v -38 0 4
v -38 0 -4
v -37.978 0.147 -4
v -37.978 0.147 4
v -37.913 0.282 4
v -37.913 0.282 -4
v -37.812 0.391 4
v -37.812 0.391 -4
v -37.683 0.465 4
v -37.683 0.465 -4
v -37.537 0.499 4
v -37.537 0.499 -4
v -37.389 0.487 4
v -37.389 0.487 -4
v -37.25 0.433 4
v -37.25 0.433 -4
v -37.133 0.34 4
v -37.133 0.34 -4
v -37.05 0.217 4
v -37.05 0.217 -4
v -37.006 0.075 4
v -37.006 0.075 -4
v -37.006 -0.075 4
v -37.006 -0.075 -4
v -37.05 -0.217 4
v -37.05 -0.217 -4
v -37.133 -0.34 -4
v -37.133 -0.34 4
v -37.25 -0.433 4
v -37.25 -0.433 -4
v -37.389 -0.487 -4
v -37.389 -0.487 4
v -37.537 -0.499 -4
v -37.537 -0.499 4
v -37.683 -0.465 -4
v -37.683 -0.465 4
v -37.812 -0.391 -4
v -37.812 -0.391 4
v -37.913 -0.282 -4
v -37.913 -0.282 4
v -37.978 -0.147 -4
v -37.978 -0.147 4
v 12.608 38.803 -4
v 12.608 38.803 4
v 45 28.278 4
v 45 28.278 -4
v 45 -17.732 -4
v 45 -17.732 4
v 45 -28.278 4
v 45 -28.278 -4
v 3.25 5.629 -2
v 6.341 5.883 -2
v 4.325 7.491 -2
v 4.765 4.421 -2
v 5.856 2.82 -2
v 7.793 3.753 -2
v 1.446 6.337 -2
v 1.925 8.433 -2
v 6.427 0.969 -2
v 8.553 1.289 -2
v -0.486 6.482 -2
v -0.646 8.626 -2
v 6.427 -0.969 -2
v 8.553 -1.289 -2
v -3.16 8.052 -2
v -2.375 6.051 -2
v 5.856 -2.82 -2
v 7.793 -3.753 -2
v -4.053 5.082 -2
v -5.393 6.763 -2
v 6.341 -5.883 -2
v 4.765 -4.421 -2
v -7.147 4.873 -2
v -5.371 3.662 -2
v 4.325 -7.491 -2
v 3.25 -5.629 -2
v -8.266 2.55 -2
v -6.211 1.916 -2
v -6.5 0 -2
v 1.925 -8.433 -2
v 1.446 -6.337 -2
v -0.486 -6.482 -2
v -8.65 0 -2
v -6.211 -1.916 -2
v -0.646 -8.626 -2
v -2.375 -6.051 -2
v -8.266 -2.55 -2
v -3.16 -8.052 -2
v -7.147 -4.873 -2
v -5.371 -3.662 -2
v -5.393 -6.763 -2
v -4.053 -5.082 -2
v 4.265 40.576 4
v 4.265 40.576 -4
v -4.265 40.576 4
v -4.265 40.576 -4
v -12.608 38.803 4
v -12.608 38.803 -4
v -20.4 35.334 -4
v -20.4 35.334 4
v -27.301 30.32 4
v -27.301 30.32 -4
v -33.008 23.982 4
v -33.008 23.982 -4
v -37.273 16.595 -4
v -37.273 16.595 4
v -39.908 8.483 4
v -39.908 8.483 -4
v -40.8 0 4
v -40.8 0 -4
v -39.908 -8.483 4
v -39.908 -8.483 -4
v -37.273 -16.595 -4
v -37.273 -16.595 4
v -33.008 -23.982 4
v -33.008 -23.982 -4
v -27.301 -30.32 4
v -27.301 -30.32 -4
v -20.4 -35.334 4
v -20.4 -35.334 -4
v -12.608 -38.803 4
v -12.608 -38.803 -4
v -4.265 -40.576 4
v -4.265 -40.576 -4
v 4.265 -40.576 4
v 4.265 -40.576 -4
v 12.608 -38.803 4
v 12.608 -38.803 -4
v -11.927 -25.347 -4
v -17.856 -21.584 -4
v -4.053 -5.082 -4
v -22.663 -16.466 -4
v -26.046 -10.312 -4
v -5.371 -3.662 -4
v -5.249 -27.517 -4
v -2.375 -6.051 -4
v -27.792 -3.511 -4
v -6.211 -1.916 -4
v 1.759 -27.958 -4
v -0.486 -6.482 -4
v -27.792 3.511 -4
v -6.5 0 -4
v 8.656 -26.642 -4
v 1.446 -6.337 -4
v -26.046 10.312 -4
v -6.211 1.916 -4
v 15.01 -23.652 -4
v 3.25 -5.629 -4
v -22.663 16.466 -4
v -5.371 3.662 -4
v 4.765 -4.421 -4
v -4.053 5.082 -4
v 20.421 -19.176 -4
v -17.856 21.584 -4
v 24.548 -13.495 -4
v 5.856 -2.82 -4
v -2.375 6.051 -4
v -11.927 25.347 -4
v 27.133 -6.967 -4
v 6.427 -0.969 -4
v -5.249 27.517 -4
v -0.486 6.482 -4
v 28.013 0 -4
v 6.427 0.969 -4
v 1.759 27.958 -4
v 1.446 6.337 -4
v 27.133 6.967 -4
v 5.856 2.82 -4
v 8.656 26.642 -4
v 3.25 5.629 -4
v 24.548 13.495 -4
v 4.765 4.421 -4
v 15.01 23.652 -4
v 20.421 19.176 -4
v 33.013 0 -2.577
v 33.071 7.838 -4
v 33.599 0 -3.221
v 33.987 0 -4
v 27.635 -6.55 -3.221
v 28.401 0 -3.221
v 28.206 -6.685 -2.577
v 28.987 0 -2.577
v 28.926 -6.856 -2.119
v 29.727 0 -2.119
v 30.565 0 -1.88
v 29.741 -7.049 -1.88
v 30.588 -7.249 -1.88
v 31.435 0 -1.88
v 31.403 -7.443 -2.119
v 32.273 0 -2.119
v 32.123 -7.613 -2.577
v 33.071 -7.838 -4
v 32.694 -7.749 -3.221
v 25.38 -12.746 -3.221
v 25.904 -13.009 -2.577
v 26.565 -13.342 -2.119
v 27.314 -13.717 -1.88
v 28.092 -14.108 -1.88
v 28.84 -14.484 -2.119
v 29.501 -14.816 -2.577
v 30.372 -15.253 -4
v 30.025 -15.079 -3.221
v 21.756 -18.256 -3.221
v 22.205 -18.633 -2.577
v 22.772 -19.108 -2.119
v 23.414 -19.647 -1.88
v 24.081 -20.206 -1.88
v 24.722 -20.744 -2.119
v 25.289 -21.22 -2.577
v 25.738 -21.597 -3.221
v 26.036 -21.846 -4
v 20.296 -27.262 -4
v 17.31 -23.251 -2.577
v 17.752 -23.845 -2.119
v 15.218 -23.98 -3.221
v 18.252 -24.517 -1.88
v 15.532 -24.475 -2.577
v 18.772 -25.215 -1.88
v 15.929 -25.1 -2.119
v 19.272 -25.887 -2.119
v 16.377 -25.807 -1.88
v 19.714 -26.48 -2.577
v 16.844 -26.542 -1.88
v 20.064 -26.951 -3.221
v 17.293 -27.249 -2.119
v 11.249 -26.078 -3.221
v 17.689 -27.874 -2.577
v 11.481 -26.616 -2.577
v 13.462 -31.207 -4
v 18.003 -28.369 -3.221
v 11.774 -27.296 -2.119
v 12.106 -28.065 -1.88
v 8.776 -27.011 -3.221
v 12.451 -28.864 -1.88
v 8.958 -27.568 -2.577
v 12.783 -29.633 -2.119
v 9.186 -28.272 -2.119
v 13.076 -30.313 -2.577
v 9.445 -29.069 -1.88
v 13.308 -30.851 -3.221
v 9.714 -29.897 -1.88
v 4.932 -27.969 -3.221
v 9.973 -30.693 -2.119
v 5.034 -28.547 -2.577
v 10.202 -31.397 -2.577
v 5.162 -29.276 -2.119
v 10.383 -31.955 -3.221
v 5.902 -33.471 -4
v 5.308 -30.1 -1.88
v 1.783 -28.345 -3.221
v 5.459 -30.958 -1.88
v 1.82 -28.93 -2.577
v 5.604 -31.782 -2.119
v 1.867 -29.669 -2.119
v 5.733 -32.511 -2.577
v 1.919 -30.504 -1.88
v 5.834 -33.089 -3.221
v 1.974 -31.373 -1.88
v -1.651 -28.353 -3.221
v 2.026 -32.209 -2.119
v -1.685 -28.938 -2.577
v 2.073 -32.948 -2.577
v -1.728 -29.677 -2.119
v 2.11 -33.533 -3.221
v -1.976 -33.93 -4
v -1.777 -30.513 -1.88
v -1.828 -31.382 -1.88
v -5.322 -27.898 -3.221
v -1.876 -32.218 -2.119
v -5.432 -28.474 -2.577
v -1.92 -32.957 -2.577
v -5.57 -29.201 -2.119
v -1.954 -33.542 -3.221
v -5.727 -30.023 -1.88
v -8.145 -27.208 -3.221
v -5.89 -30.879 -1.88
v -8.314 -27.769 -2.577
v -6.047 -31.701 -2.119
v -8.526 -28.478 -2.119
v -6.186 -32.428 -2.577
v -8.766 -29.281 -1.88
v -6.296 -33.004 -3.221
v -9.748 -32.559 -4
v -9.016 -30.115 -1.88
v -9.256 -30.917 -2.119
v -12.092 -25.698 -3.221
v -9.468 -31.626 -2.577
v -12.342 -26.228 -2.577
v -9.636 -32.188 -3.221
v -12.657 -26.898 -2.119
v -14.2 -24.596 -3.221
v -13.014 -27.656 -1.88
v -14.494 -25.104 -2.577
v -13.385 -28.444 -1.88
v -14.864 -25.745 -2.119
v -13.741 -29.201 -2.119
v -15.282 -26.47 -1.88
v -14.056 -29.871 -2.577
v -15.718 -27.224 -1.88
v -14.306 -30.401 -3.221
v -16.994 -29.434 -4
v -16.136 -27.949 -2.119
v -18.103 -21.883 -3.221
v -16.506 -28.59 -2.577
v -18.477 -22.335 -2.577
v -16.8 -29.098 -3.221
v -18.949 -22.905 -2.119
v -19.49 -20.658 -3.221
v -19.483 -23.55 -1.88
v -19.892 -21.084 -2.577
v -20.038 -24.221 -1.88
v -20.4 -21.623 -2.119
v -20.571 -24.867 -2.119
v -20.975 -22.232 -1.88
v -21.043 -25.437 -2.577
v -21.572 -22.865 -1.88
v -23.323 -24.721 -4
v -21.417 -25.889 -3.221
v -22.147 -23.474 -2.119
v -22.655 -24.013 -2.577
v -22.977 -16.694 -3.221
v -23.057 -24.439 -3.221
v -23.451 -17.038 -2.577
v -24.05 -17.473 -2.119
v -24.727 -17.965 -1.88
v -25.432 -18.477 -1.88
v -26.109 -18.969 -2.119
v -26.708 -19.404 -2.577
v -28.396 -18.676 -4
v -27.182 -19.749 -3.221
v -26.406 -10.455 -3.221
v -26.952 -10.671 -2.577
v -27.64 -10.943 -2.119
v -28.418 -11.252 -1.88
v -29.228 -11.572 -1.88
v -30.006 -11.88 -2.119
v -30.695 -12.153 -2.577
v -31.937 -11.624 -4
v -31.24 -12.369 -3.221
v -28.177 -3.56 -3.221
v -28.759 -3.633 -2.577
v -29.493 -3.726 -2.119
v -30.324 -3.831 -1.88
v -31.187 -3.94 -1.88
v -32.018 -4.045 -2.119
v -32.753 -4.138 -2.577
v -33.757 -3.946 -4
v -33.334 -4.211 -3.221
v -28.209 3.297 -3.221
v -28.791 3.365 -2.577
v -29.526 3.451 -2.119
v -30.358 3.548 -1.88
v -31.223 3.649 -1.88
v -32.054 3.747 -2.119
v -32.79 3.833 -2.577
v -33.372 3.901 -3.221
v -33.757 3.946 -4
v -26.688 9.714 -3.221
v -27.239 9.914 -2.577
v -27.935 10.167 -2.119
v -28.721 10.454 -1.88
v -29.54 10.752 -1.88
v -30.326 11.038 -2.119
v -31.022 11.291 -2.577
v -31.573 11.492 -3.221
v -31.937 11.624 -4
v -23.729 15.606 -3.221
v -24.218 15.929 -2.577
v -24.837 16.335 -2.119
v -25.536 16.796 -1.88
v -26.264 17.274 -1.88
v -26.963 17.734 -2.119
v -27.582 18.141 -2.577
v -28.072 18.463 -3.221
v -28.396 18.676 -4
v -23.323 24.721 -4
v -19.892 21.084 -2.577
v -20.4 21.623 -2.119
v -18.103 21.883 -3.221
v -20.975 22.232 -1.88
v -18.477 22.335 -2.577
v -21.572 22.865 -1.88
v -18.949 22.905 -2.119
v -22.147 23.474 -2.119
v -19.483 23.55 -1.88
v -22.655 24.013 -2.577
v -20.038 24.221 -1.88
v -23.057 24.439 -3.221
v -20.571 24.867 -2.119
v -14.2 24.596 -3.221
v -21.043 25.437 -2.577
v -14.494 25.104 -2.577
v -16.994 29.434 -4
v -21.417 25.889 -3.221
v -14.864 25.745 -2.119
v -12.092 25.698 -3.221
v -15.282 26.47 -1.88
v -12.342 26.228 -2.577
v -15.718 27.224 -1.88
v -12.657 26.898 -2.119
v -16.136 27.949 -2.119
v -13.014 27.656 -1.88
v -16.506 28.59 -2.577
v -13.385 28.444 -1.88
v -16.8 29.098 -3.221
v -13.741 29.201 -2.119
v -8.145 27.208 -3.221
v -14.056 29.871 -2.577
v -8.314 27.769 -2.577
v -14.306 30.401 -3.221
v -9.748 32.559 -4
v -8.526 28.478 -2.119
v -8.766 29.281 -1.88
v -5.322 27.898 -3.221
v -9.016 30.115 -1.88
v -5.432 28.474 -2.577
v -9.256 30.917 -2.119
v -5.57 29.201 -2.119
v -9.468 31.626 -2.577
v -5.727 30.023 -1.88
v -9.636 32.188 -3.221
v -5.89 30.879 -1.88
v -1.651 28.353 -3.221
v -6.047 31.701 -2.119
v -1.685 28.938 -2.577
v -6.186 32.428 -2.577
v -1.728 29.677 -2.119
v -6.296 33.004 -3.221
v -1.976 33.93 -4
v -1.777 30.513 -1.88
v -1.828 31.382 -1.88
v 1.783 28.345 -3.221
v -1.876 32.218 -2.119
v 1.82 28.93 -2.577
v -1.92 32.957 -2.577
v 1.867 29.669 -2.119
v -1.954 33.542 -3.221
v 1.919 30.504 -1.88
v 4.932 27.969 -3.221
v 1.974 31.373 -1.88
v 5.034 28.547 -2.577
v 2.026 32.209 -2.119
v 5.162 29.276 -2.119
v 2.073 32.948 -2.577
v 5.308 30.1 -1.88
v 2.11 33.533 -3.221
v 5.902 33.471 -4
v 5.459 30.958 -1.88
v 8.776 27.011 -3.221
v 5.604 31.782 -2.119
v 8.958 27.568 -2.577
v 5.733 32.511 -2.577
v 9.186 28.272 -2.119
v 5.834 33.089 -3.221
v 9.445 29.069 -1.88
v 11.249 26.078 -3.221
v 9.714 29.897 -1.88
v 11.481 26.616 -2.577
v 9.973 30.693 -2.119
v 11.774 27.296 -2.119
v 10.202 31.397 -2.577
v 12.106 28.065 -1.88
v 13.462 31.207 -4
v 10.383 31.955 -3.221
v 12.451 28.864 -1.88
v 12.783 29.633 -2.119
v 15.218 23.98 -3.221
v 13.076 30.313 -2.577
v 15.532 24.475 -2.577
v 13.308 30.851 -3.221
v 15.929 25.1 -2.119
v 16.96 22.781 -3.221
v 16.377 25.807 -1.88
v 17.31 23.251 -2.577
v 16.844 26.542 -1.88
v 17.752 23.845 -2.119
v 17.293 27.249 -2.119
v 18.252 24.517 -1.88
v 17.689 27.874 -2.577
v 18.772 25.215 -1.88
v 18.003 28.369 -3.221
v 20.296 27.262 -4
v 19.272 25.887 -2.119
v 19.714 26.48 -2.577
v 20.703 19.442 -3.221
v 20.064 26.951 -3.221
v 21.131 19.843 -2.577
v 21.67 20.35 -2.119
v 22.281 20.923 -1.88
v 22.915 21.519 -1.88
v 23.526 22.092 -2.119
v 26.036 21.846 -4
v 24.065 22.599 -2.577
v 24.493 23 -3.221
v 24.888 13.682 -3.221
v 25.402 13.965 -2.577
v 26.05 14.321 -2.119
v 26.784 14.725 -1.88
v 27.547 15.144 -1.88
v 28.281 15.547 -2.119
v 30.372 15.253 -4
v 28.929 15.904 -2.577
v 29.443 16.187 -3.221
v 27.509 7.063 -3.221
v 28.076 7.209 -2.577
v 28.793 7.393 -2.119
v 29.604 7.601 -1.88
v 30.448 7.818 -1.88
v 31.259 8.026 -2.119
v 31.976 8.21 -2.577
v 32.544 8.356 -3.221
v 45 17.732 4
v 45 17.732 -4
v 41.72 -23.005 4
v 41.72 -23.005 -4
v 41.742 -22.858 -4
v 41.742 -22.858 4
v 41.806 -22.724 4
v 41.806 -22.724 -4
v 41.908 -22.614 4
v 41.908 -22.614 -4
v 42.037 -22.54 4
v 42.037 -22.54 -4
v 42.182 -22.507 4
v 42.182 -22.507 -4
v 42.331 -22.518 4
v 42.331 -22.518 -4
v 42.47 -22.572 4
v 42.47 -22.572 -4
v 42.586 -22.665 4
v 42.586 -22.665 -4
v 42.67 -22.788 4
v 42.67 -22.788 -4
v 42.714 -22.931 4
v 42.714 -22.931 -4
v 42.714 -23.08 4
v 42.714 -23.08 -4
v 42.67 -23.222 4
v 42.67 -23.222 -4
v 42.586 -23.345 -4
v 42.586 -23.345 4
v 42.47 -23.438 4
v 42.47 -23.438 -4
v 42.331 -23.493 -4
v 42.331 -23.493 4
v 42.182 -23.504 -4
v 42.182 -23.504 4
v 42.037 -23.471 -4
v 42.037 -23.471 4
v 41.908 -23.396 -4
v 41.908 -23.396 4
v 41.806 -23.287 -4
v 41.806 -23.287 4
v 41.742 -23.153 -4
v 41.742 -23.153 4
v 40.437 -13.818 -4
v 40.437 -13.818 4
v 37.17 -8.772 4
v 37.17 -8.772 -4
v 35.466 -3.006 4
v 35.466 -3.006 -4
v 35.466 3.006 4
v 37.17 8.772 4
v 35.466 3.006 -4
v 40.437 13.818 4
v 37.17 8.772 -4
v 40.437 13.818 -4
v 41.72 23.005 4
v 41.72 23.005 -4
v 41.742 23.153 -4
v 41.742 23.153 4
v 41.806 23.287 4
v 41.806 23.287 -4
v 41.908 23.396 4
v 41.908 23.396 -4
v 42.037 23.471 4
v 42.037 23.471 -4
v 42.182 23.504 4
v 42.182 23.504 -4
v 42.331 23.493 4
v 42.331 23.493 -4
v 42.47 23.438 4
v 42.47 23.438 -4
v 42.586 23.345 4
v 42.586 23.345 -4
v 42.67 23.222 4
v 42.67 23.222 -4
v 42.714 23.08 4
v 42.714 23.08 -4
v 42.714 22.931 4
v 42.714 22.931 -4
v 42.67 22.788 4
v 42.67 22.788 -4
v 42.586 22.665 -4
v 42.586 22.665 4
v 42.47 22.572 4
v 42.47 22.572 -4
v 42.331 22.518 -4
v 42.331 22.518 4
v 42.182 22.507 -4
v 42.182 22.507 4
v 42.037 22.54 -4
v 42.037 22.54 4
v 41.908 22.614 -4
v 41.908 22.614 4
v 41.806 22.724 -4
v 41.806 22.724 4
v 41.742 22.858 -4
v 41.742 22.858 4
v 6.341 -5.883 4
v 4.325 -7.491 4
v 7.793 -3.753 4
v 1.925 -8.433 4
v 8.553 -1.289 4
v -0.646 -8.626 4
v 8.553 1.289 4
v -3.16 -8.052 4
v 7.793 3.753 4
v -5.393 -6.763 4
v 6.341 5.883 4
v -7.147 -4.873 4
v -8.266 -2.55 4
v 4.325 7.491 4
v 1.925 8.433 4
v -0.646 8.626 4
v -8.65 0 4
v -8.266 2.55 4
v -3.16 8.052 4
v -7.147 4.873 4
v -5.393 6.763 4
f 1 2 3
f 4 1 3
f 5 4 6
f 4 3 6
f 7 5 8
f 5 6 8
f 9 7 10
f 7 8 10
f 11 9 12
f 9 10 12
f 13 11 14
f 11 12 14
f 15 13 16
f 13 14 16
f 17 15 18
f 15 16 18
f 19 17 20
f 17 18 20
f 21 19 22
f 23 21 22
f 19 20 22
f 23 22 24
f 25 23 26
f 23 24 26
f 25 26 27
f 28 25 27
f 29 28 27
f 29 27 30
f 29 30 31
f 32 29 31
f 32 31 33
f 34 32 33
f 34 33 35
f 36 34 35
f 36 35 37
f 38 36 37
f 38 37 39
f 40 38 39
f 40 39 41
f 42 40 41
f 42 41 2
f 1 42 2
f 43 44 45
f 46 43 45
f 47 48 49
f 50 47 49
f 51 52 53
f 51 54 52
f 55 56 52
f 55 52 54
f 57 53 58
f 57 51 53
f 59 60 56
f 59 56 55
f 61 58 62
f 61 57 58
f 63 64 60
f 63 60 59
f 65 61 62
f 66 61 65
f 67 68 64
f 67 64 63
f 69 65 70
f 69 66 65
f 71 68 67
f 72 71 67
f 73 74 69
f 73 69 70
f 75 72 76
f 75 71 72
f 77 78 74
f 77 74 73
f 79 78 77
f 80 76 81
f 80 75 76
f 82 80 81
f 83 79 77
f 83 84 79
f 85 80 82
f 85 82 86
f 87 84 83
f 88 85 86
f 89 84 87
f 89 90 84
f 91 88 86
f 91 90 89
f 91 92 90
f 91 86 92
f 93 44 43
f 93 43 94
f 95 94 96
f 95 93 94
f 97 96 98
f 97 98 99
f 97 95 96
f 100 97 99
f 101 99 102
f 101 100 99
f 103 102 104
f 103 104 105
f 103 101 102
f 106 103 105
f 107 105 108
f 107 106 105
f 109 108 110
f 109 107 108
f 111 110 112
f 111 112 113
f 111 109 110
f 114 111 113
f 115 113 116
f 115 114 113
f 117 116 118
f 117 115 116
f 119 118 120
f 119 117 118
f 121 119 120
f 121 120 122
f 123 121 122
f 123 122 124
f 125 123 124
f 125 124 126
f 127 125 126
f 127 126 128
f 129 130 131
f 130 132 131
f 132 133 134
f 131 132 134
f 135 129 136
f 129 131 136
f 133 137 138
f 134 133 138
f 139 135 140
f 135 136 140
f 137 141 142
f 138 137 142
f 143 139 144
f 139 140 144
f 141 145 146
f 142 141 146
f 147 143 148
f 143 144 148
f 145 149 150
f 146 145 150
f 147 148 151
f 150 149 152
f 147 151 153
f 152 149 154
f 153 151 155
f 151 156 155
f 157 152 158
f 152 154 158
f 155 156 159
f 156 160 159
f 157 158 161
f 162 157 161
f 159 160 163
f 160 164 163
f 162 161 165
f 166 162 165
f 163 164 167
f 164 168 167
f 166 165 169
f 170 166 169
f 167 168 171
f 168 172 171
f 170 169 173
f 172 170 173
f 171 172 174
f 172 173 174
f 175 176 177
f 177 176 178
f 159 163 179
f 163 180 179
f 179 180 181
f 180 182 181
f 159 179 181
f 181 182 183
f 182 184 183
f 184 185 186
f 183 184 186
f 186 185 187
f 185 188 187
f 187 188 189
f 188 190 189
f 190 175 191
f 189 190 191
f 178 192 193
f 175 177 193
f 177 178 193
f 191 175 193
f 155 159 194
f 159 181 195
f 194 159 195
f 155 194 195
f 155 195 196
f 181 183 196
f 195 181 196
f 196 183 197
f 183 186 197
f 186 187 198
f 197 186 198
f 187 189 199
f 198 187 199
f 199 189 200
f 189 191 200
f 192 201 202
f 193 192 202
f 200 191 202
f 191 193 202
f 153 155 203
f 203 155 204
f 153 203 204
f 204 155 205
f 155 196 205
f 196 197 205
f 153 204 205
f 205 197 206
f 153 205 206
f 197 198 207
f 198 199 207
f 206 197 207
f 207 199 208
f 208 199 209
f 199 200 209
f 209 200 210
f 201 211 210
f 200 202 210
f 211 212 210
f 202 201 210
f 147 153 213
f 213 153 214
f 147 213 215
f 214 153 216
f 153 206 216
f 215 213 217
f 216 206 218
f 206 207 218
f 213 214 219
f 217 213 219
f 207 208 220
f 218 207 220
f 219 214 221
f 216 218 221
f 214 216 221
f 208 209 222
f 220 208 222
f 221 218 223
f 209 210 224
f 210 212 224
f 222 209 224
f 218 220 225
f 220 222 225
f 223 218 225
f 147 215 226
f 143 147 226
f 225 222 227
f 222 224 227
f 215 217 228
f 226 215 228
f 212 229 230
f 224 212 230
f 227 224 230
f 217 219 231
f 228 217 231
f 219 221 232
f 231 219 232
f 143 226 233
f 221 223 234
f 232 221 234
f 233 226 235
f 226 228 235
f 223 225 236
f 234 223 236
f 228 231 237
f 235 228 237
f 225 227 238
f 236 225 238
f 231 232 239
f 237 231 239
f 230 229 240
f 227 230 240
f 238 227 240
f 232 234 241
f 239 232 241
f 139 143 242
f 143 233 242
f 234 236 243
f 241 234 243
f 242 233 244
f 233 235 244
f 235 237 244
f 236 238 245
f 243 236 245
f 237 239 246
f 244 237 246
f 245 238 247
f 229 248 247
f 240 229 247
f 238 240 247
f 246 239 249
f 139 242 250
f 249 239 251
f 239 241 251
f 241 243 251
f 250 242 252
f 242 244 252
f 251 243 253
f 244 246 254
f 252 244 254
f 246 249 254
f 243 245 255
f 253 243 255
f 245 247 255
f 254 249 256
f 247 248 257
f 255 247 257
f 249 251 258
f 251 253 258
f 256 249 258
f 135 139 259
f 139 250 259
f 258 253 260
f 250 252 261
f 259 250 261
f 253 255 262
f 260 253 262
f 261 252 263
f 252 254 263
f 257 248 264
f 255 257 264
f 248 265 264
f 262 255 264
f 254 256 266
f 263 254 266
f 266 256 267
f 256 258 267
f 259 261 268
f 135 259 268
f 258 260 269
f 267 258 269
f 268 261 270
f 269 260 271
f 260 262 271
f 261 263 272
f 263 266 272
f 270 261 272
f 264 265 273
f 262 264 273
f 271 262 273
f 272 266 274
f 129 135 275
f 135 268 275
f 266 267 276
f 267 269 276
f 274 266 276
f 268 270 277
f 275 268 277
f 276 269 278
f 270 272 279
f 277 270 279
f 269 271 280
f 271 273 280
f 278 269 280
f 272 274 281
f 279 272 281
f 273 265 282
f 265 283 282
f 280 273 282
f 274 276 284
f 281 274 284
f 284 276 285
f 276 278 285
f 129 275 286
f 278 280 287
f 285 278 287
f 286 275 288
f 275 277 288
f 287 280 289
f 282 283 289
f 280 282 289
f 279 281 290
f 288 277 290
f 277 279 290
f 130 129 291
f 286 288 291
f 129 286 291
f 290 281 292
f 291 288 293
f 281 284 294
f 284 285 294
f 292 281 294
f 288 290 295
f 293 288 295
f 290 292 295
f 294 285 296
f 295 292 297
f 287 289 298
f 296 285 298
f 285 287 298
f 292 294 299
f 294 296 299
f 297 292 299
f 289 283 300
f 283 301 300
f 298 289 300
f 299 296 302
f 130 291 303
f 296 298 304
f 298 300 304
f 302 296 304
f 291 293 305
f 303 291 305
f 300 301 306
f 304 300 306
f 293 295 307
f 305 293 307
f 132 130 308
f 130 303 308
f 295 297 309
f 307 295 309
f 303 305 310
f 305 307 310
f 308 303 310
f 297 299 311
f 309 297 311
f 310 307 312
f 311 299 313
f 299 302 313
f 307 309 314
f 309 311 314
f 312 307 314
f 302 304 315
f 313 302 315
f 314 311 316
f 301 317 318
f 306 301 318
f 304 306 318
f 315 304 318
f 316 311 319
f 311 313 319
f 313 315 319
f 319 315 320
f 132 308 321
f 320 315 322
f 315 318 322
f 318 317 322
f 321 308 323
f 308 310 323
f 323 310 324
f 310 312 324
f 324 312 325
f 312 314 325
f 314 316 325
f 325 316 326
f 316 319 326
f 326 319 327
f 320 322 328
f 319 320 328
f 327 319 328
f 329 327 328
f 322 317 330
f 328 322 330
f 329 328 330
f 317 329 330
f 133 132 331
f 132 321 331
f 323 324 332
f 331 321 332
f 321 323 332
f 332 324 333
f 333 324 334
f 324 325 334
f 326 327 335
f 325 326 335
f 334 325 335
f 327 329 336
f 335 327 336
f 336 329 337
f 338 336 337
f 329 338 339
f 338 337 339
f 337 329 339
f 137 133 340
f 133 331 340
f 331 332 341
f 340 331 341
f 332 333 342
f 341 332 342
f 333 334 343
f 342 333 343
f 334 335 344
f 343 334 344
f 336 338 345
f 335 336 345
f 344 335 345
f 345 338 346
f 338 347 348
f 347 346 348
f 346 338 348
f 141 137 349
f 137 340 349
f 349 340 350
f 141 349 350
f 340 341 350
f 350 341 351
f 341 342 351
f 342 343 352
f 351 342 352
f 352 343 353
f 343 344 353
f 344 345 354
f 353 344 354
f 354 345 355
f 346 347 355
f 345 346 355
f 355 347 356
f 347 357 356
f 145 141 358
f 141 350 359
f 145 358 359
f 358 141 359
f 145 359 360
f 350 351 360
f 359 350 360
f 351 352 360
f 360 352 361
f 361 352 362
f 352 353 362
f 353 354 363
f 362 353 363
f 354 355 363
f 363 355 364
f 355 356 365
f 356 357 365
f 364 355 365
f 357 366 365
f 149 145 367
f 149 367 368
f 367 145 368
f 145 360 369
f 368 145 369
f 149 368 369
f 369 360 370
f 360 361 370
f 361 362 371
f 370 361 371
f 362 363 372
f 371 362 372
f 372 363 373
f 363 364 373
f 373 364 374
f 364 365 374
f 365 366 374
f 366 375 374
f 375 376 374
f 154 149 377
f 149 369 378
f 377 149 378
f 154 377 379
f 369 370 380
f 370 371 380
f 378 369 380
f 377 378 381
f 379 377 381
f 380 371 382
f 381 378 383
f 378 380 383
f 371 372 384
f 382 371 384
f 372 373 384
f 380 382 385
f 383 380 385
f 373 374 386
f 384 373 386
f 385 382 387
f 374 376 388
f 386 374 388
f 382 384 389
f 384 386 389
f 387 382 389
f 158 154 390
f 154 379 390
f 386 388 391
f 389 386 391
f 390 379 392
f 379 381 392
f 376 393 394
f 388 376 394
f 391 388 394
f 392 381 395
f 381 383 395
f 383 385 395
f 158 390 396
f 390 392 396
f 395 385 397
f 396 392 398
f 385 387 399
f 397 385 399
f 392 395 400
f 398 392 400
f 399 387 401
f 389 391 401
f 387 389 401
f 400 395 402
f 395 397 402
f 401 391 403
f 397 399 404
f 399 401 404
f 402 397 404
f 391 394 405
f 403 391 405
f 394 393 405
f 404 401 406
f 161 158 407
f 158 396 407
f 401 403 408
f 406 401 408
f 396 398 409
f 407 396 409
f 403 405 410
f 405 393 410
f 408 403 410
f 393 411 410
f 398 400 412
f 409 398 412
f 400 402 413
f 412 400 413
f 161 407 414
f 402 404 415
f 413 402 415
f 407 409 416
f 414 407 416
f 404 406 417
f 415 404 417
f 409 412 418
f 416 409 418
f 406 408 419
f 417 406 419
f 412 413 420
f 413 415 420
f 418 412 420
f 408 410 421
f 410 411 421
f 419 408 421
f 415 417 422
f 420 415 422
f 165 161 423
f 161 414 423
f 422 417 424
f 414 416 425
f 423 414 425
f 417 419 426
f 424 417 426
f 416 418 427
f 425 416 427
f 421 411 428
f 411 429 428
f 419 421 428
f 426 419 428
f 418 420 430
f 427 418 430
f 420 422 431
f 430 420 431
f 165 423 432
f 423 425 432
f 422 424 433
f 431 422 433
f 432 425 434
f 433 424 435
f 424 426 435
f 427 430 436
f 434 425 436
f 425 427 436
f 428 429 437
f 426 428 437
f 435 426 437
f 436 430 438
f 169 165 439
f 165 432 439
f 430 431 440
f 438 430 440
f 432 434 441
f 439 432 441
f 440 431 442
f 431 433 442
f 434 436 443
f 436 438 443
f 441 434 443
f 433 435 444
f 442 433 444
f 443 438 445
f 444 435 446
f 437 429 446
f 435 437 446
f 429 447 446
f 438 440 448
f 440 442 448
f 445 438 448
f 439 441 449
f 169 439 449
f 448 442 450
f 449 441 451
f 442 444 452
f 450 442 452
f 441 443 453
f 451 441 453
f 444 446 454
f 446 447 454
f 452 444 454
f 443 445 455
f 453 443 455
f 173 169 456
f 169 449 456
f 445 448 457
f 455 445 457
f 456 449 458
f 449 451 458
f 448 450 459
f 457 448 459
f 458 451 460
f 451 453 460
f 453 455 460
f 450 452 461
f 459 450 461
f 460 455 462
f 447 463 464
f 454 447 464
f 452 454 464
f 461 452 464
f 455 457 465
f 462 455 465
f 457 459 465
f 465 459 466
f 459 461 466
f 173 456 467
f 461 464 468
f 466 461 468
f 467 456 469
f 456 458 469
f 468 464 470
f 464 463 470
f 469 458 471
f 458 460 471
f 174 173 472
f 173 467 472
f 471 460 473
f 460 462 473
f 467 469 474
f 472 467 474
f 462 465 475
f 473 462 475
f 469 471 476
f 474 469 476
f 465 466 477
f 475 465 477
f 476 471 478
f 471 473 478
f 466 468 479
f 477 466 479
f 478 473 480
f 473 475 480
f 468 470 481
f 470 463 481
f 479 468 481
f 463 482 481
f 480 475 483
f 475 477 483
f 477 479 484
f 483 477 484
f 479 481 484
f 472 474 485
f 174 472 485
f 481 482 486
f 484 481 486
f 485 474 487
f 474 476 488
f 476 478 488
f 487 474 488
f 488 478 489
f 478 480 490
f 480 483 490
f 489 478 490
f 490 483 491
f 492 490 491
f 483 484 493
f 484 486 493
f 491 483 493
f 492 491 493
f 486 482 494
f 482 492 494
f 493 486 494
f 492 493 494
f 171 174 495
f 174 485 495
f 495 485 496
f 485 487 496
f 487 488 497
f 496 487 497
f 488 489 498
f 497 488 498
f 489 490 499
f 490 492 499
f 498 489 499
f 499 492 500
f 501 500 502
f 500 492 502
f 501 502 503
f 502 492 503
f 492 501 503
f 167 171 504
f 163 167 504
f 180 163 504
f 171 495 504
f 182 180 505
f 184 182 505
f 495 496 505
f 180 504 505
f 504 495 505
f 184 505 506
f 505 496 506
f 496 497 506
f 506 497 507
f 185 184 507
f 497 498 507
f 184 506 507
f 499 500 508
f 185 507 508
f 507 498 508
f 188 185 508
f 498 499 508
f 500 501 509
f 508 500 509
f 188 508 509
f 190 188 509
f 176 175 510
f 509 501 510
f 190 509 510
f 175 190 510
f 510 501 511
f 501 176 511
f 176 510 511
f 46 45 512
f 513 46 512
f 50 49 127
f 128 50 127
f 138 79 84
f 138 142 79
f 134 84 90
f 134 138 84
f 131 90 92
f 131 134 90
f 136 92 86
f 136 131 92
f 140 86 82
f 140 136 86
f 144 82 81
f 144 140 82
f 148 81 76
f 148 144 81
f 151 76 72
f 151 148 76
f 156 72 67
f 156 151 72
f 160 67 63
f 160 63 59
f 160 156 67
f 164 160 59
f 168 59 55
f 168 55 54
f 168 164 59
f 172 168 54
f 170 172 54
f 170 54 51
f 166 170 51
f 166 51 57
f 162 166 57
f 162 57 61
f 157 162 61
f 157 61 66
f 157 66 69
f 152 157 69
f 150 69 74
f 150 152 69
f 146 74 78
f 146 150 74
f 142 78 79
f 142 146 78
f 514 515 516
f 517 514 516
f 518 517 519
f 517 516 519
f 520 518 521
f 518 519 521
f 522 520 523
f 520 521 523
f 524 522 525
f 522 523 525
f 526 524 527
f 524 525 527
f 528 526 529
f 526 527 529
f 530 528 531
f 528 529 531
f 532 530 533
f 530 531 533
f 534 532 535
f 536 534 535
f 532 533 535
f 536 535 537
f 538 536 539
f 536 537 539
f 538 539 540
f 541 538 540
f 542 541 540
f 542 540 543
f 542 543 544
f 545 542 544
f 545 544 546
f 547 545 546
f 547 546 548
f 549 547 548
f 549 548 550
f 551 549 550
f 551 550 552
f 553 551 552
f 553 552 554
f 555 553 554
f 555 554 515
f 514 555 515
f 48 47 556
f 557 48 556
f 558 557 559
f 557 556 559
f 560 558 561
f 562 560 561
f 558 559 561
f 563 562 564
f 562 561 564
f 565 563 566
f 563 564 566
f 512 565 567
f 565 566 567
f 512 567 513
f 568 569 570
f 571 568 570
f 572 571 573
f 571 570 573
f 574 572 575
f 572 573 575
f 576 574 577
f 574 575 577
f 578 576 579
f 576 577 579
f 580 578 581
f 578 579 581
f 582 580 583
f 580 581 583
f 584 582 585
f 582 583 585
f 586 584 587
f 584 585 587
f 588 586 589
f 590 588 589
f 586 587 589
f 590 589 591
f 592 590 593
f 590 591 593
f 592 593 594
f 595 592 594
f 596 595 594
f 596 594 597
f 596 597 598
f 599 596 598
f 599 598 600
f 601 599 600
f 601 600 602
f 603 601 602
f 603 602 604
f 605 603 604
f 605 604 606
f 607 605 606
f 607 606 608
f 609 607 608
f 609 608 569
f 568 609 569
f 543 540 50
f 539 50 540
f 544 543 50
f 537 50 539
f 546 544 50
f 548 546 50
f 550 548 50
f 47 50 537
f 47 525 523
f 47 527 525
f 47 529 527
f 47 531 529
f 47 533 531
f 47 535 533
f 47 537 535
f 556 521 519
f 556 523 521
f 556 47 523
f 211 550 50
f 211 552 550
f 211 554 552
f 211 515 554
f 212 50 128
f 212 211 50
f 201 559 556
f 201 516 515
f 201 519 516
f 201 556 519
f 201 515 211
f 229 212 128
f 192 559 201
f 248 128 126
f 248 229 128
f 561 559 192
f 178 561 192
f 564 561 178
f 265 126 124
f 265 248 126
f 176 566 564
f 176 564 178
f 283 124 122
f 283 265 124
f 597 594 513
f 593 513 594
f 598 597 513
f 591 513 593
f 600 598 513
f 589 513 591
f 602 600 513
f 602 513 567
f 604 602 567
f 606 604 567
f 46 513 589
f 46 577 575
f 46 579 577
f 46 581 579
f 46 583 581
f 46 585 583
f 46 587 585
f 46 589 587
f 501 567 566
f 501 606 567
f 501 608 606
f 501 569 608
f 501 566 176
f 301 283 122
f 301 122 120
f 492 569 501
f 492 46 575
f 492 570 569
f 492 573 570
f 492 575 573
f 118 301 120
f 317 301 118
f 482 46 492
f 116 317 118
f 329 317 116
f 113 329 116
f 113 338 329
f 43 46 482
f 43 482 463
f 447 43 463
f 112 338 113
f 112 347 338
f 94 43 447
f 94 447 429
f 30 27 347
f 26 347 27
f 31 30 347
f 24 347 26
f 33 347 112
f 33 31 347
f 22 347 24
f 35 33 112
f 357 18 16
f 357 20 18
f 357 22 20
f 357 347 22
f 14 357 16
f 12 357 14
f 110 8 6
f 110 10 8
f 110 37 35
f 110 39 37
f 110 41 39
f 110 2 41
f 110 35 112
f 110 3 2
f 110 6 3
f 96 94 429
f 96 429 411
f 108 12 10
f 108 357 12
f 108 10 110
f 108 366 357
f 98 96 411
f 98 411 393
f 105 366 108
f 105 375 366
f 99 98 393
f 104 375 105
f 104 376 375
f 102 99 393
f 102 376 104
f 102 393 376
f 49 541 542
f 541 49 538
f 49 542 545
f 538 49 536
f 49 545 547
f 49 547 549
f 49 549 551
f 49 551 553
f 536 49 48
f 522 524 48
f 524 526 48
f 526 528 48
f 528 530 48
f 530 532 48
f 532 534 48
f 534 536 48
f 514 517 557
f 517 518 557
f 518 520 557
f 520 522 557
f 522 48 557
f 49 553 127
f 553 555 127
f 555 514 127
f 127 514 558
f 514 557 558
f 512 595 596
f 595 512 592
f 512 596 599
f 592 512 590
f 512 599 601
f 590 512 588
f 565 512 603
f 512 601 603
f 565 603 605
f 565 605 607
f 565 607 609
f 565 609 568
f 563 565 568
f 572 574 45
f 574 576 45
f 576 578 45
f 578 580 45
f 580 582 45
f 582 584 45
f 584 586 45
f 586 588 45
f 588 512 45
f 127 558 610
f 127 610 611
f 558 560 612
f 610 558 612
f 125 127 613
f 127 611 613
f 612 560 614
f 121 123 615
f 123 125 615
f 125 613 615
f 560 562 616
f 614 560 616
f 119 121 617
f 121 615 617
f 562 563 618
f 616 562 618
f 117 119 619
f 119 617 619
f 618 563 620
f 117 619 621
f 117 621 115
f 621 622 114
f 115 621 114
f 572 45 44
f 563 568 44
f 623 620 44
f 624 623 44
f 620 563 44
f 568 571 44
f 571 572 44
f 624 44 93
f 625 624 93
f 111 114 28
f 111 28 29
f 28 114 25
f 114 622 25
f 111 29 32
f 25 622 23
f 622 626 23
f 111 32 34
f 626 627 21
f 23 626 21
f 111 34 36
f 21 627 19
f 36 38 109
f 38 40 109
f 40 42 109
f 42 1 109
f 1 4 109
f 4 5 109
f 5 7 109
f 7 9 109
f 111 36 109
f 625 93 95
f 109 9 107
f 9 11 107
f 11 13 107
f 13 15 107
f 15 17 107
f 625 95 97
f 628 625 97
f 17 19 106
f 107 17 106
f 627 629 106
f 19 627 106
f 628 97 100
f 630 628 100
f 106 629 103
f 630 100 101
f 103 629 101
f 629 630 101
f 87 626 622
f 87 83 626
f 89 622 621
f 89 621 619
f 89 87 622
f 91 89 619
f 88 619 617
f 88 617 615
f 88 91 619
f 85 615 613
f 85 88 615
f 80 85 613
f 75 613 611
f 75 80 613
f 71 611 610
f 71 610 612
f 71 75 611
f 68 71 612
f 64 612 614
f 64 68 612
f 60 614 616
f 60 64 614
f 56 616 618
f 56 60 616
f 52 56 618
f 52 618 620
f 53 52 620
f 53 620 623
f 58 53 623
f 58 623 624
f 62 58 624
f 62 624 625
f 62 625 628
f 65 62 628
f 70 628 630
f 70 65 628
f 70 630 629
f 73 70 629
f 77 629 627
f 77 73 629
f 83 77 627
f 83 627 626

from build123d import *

# Parameters (mm, degrees)
SKETCH_1_R          = 40.8
EXTRUDE_1_DEPTH     = 4
SKETCH_3_R          = 3.15
CUT_EXTRUDE_1_DEPTH = 10
EXTRUDE_START       = -8
EXTRUDE_3_DEPTH     = 8
SKETCH_6_R          = 21
CUT_EXTRUDE_2_DEPTH = 10
SKETCH_7_R          = 0.5
CUT_EXTRUDE_3_DEPTH = 10


with BuildPart() as part:
    # 草图1 → 凸台-拉伸1 (new, symmetric)
    with BuildSketch(Plane.XY):
        Circle(SKETCH_1_R)
    extrude(amount=EXTRUDE_1_DEPTH, both=True)

    # 草图2 → 切除-旋转2 (revolve, cut)
    with BuildSketch(Plane(origin=(0, 0, 0), x_dir=(1, 0, 0), z_dir=(0, 1, 0)), mode=Mode.PRIVATE) as cut_revolve_2_sk:
        Polygon((0, 4), (0, -4), (8.65, -4), (8.65, 2), (6.5, 2), (6.5, 4), align=None)
    revolve(cut_revolve_2_sk.sketch.rotate(Axis((0, 0, -4), (0, 0, 1)), 180), axis=Axis((0, 0, -4), (0, 0, 1)), mode=Mode.SUBTRACT)

    # 草图3 → 切除-旋转3 (revolve, cut)
    with BuildSketch(Plane(origin=(0, 0, 0), x_dir=(1, 0, 0), z_dir=(0, 1, 0))):
        with Locations((31, 5)):
            Circle(SKETCH_3_R)
    revolve(axis=Axis((0, 0, 0), (0, 0, -1)), mode=Mode.SUBTRACT)

    # 草图4 → 切除-拉伸1 (cut)
    with BuildSketch(Plane(origin=(0, 0, -4), x_dir=(-1, 0, 0), z_dir=(0, 0, -1))):
        Polygon((-36, 19.2), (-36, -19.2), (-40.8, -19.2), (-40.8, 0), (-40.8, 19.2), align=None)
    extrude(amount=-CUT_EXTRUDE_1_DEPTH, mode=Mode.SUBTRACT)

    # 草图5 → 凸台-拉伸3 (add)
    with BuildSketch(Plane(origin=(0, 0, -4), x_dir=(-1, 0, 0), z_dir=(0, 0, -1)).offset(EXTRUDE_START)):
        with BuildLine():
            Line((-12.60789337, 38.803105865), (-45, 28.278272418))
            Line((-45, 28.278272418), (-45, -28.278272418))
            Line((-45, -28.278272418), (-12.60789337, -38.803105865))
            ThreePointArc((-12.60789337, -38.803105865), (-24.80809717, -32.391330859), (-34.177392951, -22.283307903))
            Line((-34.177392951, -22.283307903), (-34.876380269, 21.172578948))
            ThreePointArc((-34.876380269, 21.172578948), (-25.32583524, 31.988155142), (-12.60789337, 38.803105865))
        make_face()
    extrude(amount=EXTRUDE_3_DEPTH)

    # 草图6 → 切除-拉伸2 (cut)
    with BuildSketch(Plane(origin=(0, 0, -4), x_dir=(-1, 0, 0), z_dir=(0, 0, -1))):
        with Locations((-56.25, 0)):
            Circle(SKETCH_6_R)
    extrude(amount=-CUT_EXTRUDE_2_DEPTH, mode=Mode.SUBTRACT)

    # 草图7 → 切除-拉伸3 (cut)
    with BuildSketch(Plane(origin=(0, 0, -4), x_dir=(-1, 0, 0), z_dir=(0, 0, -1))):
        with Locations((-42.219558781, 23.005329022)):
            Circle(SKETCH_7_R)
        with Locations((-42.219558781, -23.005329022)):
            Circle(SKETCH_7_R)
        with Locations((37.5, 0)):
            Circle(SKETCH_7_R)
    extrude(amount=-CUT_EXTRUDE_3_DEPTH, mode=Mode.SUBTRACT)


solid = part.part
